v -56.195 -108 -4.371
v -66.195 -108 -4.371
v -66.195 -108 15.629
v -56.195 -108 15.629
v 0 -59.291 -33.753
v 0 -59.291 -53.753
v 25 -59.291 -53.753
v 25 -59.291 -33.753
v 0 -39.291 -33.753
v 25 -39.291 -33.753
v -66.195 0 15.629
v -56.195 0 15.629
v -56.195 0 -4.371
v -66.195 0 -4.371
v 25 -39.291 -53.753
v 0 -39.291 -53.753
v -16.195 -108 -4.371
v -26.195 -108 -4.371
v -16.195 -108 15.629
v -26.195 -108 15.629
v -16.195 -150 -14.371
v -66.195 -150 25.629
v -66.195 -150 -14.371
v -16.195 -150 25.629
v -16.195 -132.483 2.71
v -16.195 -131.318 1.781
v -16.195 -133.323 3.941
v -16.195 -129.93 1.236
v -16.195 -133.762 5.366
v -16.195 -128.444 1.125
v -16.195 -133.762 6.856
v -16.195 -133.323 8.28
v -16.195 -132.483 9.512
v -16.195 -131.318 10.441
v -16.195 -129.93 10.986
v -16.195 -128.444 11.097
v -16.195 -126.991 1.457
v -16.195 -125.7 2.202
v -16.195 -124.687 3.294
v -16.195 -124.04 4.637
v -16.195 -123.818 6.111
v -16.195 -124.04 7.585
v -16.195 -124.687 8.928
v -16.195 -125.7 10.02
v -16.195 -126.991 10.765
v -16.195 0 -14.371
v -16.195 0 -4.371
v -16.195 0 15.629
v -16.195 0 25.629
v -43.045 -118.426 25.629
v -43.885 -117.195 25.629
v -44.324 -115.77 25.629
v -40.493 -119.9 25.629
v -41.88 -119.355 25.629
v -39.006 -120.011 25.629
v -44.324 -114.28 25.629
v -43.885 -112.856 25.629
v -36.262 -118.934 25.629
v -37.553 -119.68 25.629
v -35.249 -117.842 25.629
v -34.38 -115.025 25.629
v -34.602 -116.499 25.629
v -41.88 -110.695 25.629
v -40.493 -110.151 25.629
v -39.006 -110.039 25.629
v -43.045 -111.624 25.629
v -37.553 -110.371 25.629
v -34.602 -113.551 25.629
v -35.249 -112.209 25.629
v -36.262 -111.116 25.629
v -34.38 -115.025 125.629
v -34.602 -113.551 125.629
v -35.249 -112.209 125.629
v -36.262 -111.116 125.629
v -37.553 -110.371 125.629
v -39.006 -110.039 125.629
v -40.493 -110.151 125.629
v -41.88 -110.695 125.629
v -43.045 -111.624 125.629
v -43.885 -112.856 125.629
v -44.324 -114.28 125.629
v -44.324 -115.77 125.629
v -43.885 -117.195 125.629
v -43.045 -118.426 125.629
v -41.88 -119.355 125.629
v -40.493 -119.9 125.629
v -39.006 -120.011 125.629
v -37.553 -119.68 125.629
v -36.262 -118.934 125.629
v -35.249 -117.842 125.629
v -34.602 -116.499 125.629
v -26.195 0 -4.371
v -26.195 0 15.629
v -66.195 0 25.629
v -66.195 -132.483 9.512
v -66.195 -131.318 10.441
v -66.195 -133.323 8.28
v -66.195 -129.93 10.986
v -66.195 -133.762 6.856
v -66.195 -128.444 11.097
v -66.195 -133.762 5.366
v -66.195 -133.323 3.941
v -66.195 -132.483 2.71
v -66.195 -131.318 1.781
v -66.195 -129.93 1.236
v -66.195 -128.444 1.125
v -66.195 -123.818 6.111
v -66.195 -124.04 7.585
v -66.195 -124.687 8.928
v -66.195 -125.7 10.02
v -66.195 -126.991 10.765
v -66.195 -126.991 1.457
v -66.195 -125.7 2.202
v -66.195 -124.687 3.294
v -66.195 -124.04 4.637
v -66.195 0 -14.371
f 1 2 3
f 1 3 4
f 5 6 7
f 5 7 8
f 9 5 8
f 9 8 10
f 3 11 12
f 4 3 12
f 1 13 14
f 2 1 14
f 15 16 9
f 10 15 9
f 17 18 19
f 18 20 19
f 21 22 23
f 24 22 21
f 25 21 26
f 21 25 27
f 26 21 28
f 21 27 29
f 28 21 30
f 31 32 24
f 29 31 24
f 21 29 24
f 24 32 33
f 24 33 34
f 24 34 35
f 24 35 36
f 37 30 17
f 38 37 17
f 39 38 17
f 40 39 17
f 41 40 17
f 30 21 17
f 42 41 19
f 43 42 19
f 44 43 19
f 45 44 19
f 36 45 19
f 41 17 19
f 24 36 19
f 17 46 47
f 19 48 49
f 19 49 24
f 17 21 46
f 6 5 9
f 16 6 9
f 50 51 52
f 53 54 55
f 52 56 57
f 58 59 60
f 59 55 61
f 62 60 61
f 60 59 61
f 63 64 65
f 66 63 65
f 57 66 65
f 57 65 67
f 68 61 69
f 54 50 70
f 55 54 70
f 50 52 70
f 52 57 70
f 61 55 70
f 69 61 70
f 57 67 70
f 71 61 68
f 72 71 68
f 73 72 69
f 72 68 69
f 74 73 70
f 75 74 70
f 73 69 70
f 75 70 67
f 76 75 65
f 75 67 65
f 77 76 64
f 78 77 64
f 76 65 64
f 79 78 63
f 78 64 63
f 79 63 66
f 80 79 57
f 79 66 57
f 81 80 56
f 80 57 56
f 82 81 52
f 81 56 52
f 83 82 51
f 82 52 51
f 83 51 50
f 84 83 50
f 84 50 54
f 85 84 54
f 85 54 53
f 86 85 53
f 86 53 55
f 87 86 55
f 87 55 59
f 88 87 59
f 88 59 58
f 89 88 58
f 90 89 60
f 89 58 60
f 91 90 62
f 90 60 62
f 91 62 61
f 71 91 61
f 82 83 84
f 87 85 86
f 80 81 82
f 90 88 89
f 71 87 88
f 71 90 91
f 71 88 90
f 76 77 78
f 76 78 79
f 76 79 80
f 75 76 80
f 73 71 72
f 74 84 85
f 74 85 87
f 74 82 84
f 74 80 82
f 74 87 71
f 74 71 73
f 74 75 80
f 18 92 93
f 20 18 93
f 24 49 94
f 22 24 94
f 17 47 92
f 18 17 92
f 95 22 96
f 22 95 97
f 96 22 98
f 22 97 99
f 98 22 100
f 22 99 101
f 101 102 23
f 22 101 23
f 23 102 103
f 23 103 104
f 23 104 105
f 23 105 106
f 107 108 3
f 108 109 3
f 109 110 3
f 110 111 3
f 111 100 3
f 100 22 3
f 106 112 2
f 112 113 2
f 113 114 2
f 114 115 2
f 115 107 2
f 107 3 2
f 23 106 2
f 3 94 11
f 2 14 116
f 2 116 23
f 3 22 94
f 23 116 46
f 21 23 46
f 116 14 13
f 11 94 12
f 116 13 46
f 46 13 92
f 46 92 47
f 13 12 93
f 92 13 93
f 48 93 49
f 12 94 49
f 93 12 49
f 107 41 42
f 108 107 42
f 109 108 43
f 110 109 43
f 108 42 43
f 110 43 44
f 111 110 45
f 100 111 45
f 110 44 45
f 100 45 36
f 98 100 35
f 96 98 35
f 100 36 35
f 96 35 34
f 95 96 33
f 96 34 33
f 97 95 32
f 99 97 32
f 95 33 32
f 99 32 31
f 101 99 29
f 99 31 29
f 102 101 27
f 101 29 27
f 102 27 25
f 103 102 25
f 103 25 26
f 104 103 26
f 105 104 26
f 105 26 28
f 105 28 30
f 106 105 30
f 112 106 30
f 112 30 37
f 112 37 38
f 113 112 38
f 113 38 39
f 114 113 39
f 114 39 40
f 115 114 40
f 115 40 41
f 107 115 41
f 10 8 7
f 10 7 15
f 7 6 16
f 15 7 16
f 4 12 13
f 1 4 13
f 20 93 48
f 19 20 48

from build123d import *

# Parameters (mm, degrees)
F1_DEPTH  = 150
F2_W      = 20
F2_H      = 20
F3_DEPTH  = 25
F4_R      = 5
F5_DEPTH  = 15.2
F6_W      = 50
F6_H      = 40
F7_DEPTH  = 42
F8_R      = 5
F9_DEPTH  = 74.4
F10_R     = 5
F11_DEPTH = 100


# Not quite as in the source:
# - the program builds the solid bodies; features that only make, move or delete a surface that nothing else refers to are left out


with BuildPart() as f1:
    # F0 (on Front) → F1 (new body)
    with BuildSketch(Plane.XZ):
        Polygon((-16.1953240633, 25.6288190931), (-66.1953240633, 25.6288190931), (-66.1953240633, 15.6288190931), (-56.1953240633, 15.6288190931), (-56.1953240633, -4.3711809069), (-66.1953240633, -4.3711809069), (-66.1953240633, -14.3711809069), (-16.1953240633, -14.3711809069), (-16.1953240633, -4.3711809069), (-26.1953240633, -4.3711809069), (-26.1953240633, 15.6288190931), (-16.1953240633, 15.6288190931), align=None)
    extrude(amount=F1_DEPTH)

    # F6 (on face) → F7 (join)
    with BuildSketch(Plane.XZ.offset(150)):
        with Locations((-41.1953240633, 5.6288190931)):
            Rectangle(F6_W, F6_H)
    extrude(amount=-F7_DEPTH)

    # F8 (on Right) → F9 (cut)
    with BuildSketch(Plane.YZ):
        with Locations((-128.8177222013, 6.1109075323)):
            Circle(F8_R)
    extrude(amount=-F9_DEPTH, mode=Mode.SUBTRACT)


with BuildPart() as f3:
    # F2 (on Right) → F3 (new body)
    with BuildSketch(Plane.YZ):
        with Locations((-49.2914298177, -43.7528586388)):
            Rectangle(F2_W, F2_H)
    extrude(amount=F3_DEPTH)

    # F4 (on Right) → F5 (join)
    with BuildSketch(Plane.YZ):
        with Locations((-49.3974834681, -43.340831995)):
            Circle(F4_R)
    extrude(amount=F5_DEPTH)


with BuildPart() as f11:
    # F10 (on face) → F11 (new body)
    with BuildSketch(Plane.XY.offset(25.6288190931)):
        with Locations((-39.3799170852, -115.0251403451)):
            Circle(F10_R)
    extrude(amount=F11_DEPTH)


solid = Compound([f1.part, f3.part, f11.part])
